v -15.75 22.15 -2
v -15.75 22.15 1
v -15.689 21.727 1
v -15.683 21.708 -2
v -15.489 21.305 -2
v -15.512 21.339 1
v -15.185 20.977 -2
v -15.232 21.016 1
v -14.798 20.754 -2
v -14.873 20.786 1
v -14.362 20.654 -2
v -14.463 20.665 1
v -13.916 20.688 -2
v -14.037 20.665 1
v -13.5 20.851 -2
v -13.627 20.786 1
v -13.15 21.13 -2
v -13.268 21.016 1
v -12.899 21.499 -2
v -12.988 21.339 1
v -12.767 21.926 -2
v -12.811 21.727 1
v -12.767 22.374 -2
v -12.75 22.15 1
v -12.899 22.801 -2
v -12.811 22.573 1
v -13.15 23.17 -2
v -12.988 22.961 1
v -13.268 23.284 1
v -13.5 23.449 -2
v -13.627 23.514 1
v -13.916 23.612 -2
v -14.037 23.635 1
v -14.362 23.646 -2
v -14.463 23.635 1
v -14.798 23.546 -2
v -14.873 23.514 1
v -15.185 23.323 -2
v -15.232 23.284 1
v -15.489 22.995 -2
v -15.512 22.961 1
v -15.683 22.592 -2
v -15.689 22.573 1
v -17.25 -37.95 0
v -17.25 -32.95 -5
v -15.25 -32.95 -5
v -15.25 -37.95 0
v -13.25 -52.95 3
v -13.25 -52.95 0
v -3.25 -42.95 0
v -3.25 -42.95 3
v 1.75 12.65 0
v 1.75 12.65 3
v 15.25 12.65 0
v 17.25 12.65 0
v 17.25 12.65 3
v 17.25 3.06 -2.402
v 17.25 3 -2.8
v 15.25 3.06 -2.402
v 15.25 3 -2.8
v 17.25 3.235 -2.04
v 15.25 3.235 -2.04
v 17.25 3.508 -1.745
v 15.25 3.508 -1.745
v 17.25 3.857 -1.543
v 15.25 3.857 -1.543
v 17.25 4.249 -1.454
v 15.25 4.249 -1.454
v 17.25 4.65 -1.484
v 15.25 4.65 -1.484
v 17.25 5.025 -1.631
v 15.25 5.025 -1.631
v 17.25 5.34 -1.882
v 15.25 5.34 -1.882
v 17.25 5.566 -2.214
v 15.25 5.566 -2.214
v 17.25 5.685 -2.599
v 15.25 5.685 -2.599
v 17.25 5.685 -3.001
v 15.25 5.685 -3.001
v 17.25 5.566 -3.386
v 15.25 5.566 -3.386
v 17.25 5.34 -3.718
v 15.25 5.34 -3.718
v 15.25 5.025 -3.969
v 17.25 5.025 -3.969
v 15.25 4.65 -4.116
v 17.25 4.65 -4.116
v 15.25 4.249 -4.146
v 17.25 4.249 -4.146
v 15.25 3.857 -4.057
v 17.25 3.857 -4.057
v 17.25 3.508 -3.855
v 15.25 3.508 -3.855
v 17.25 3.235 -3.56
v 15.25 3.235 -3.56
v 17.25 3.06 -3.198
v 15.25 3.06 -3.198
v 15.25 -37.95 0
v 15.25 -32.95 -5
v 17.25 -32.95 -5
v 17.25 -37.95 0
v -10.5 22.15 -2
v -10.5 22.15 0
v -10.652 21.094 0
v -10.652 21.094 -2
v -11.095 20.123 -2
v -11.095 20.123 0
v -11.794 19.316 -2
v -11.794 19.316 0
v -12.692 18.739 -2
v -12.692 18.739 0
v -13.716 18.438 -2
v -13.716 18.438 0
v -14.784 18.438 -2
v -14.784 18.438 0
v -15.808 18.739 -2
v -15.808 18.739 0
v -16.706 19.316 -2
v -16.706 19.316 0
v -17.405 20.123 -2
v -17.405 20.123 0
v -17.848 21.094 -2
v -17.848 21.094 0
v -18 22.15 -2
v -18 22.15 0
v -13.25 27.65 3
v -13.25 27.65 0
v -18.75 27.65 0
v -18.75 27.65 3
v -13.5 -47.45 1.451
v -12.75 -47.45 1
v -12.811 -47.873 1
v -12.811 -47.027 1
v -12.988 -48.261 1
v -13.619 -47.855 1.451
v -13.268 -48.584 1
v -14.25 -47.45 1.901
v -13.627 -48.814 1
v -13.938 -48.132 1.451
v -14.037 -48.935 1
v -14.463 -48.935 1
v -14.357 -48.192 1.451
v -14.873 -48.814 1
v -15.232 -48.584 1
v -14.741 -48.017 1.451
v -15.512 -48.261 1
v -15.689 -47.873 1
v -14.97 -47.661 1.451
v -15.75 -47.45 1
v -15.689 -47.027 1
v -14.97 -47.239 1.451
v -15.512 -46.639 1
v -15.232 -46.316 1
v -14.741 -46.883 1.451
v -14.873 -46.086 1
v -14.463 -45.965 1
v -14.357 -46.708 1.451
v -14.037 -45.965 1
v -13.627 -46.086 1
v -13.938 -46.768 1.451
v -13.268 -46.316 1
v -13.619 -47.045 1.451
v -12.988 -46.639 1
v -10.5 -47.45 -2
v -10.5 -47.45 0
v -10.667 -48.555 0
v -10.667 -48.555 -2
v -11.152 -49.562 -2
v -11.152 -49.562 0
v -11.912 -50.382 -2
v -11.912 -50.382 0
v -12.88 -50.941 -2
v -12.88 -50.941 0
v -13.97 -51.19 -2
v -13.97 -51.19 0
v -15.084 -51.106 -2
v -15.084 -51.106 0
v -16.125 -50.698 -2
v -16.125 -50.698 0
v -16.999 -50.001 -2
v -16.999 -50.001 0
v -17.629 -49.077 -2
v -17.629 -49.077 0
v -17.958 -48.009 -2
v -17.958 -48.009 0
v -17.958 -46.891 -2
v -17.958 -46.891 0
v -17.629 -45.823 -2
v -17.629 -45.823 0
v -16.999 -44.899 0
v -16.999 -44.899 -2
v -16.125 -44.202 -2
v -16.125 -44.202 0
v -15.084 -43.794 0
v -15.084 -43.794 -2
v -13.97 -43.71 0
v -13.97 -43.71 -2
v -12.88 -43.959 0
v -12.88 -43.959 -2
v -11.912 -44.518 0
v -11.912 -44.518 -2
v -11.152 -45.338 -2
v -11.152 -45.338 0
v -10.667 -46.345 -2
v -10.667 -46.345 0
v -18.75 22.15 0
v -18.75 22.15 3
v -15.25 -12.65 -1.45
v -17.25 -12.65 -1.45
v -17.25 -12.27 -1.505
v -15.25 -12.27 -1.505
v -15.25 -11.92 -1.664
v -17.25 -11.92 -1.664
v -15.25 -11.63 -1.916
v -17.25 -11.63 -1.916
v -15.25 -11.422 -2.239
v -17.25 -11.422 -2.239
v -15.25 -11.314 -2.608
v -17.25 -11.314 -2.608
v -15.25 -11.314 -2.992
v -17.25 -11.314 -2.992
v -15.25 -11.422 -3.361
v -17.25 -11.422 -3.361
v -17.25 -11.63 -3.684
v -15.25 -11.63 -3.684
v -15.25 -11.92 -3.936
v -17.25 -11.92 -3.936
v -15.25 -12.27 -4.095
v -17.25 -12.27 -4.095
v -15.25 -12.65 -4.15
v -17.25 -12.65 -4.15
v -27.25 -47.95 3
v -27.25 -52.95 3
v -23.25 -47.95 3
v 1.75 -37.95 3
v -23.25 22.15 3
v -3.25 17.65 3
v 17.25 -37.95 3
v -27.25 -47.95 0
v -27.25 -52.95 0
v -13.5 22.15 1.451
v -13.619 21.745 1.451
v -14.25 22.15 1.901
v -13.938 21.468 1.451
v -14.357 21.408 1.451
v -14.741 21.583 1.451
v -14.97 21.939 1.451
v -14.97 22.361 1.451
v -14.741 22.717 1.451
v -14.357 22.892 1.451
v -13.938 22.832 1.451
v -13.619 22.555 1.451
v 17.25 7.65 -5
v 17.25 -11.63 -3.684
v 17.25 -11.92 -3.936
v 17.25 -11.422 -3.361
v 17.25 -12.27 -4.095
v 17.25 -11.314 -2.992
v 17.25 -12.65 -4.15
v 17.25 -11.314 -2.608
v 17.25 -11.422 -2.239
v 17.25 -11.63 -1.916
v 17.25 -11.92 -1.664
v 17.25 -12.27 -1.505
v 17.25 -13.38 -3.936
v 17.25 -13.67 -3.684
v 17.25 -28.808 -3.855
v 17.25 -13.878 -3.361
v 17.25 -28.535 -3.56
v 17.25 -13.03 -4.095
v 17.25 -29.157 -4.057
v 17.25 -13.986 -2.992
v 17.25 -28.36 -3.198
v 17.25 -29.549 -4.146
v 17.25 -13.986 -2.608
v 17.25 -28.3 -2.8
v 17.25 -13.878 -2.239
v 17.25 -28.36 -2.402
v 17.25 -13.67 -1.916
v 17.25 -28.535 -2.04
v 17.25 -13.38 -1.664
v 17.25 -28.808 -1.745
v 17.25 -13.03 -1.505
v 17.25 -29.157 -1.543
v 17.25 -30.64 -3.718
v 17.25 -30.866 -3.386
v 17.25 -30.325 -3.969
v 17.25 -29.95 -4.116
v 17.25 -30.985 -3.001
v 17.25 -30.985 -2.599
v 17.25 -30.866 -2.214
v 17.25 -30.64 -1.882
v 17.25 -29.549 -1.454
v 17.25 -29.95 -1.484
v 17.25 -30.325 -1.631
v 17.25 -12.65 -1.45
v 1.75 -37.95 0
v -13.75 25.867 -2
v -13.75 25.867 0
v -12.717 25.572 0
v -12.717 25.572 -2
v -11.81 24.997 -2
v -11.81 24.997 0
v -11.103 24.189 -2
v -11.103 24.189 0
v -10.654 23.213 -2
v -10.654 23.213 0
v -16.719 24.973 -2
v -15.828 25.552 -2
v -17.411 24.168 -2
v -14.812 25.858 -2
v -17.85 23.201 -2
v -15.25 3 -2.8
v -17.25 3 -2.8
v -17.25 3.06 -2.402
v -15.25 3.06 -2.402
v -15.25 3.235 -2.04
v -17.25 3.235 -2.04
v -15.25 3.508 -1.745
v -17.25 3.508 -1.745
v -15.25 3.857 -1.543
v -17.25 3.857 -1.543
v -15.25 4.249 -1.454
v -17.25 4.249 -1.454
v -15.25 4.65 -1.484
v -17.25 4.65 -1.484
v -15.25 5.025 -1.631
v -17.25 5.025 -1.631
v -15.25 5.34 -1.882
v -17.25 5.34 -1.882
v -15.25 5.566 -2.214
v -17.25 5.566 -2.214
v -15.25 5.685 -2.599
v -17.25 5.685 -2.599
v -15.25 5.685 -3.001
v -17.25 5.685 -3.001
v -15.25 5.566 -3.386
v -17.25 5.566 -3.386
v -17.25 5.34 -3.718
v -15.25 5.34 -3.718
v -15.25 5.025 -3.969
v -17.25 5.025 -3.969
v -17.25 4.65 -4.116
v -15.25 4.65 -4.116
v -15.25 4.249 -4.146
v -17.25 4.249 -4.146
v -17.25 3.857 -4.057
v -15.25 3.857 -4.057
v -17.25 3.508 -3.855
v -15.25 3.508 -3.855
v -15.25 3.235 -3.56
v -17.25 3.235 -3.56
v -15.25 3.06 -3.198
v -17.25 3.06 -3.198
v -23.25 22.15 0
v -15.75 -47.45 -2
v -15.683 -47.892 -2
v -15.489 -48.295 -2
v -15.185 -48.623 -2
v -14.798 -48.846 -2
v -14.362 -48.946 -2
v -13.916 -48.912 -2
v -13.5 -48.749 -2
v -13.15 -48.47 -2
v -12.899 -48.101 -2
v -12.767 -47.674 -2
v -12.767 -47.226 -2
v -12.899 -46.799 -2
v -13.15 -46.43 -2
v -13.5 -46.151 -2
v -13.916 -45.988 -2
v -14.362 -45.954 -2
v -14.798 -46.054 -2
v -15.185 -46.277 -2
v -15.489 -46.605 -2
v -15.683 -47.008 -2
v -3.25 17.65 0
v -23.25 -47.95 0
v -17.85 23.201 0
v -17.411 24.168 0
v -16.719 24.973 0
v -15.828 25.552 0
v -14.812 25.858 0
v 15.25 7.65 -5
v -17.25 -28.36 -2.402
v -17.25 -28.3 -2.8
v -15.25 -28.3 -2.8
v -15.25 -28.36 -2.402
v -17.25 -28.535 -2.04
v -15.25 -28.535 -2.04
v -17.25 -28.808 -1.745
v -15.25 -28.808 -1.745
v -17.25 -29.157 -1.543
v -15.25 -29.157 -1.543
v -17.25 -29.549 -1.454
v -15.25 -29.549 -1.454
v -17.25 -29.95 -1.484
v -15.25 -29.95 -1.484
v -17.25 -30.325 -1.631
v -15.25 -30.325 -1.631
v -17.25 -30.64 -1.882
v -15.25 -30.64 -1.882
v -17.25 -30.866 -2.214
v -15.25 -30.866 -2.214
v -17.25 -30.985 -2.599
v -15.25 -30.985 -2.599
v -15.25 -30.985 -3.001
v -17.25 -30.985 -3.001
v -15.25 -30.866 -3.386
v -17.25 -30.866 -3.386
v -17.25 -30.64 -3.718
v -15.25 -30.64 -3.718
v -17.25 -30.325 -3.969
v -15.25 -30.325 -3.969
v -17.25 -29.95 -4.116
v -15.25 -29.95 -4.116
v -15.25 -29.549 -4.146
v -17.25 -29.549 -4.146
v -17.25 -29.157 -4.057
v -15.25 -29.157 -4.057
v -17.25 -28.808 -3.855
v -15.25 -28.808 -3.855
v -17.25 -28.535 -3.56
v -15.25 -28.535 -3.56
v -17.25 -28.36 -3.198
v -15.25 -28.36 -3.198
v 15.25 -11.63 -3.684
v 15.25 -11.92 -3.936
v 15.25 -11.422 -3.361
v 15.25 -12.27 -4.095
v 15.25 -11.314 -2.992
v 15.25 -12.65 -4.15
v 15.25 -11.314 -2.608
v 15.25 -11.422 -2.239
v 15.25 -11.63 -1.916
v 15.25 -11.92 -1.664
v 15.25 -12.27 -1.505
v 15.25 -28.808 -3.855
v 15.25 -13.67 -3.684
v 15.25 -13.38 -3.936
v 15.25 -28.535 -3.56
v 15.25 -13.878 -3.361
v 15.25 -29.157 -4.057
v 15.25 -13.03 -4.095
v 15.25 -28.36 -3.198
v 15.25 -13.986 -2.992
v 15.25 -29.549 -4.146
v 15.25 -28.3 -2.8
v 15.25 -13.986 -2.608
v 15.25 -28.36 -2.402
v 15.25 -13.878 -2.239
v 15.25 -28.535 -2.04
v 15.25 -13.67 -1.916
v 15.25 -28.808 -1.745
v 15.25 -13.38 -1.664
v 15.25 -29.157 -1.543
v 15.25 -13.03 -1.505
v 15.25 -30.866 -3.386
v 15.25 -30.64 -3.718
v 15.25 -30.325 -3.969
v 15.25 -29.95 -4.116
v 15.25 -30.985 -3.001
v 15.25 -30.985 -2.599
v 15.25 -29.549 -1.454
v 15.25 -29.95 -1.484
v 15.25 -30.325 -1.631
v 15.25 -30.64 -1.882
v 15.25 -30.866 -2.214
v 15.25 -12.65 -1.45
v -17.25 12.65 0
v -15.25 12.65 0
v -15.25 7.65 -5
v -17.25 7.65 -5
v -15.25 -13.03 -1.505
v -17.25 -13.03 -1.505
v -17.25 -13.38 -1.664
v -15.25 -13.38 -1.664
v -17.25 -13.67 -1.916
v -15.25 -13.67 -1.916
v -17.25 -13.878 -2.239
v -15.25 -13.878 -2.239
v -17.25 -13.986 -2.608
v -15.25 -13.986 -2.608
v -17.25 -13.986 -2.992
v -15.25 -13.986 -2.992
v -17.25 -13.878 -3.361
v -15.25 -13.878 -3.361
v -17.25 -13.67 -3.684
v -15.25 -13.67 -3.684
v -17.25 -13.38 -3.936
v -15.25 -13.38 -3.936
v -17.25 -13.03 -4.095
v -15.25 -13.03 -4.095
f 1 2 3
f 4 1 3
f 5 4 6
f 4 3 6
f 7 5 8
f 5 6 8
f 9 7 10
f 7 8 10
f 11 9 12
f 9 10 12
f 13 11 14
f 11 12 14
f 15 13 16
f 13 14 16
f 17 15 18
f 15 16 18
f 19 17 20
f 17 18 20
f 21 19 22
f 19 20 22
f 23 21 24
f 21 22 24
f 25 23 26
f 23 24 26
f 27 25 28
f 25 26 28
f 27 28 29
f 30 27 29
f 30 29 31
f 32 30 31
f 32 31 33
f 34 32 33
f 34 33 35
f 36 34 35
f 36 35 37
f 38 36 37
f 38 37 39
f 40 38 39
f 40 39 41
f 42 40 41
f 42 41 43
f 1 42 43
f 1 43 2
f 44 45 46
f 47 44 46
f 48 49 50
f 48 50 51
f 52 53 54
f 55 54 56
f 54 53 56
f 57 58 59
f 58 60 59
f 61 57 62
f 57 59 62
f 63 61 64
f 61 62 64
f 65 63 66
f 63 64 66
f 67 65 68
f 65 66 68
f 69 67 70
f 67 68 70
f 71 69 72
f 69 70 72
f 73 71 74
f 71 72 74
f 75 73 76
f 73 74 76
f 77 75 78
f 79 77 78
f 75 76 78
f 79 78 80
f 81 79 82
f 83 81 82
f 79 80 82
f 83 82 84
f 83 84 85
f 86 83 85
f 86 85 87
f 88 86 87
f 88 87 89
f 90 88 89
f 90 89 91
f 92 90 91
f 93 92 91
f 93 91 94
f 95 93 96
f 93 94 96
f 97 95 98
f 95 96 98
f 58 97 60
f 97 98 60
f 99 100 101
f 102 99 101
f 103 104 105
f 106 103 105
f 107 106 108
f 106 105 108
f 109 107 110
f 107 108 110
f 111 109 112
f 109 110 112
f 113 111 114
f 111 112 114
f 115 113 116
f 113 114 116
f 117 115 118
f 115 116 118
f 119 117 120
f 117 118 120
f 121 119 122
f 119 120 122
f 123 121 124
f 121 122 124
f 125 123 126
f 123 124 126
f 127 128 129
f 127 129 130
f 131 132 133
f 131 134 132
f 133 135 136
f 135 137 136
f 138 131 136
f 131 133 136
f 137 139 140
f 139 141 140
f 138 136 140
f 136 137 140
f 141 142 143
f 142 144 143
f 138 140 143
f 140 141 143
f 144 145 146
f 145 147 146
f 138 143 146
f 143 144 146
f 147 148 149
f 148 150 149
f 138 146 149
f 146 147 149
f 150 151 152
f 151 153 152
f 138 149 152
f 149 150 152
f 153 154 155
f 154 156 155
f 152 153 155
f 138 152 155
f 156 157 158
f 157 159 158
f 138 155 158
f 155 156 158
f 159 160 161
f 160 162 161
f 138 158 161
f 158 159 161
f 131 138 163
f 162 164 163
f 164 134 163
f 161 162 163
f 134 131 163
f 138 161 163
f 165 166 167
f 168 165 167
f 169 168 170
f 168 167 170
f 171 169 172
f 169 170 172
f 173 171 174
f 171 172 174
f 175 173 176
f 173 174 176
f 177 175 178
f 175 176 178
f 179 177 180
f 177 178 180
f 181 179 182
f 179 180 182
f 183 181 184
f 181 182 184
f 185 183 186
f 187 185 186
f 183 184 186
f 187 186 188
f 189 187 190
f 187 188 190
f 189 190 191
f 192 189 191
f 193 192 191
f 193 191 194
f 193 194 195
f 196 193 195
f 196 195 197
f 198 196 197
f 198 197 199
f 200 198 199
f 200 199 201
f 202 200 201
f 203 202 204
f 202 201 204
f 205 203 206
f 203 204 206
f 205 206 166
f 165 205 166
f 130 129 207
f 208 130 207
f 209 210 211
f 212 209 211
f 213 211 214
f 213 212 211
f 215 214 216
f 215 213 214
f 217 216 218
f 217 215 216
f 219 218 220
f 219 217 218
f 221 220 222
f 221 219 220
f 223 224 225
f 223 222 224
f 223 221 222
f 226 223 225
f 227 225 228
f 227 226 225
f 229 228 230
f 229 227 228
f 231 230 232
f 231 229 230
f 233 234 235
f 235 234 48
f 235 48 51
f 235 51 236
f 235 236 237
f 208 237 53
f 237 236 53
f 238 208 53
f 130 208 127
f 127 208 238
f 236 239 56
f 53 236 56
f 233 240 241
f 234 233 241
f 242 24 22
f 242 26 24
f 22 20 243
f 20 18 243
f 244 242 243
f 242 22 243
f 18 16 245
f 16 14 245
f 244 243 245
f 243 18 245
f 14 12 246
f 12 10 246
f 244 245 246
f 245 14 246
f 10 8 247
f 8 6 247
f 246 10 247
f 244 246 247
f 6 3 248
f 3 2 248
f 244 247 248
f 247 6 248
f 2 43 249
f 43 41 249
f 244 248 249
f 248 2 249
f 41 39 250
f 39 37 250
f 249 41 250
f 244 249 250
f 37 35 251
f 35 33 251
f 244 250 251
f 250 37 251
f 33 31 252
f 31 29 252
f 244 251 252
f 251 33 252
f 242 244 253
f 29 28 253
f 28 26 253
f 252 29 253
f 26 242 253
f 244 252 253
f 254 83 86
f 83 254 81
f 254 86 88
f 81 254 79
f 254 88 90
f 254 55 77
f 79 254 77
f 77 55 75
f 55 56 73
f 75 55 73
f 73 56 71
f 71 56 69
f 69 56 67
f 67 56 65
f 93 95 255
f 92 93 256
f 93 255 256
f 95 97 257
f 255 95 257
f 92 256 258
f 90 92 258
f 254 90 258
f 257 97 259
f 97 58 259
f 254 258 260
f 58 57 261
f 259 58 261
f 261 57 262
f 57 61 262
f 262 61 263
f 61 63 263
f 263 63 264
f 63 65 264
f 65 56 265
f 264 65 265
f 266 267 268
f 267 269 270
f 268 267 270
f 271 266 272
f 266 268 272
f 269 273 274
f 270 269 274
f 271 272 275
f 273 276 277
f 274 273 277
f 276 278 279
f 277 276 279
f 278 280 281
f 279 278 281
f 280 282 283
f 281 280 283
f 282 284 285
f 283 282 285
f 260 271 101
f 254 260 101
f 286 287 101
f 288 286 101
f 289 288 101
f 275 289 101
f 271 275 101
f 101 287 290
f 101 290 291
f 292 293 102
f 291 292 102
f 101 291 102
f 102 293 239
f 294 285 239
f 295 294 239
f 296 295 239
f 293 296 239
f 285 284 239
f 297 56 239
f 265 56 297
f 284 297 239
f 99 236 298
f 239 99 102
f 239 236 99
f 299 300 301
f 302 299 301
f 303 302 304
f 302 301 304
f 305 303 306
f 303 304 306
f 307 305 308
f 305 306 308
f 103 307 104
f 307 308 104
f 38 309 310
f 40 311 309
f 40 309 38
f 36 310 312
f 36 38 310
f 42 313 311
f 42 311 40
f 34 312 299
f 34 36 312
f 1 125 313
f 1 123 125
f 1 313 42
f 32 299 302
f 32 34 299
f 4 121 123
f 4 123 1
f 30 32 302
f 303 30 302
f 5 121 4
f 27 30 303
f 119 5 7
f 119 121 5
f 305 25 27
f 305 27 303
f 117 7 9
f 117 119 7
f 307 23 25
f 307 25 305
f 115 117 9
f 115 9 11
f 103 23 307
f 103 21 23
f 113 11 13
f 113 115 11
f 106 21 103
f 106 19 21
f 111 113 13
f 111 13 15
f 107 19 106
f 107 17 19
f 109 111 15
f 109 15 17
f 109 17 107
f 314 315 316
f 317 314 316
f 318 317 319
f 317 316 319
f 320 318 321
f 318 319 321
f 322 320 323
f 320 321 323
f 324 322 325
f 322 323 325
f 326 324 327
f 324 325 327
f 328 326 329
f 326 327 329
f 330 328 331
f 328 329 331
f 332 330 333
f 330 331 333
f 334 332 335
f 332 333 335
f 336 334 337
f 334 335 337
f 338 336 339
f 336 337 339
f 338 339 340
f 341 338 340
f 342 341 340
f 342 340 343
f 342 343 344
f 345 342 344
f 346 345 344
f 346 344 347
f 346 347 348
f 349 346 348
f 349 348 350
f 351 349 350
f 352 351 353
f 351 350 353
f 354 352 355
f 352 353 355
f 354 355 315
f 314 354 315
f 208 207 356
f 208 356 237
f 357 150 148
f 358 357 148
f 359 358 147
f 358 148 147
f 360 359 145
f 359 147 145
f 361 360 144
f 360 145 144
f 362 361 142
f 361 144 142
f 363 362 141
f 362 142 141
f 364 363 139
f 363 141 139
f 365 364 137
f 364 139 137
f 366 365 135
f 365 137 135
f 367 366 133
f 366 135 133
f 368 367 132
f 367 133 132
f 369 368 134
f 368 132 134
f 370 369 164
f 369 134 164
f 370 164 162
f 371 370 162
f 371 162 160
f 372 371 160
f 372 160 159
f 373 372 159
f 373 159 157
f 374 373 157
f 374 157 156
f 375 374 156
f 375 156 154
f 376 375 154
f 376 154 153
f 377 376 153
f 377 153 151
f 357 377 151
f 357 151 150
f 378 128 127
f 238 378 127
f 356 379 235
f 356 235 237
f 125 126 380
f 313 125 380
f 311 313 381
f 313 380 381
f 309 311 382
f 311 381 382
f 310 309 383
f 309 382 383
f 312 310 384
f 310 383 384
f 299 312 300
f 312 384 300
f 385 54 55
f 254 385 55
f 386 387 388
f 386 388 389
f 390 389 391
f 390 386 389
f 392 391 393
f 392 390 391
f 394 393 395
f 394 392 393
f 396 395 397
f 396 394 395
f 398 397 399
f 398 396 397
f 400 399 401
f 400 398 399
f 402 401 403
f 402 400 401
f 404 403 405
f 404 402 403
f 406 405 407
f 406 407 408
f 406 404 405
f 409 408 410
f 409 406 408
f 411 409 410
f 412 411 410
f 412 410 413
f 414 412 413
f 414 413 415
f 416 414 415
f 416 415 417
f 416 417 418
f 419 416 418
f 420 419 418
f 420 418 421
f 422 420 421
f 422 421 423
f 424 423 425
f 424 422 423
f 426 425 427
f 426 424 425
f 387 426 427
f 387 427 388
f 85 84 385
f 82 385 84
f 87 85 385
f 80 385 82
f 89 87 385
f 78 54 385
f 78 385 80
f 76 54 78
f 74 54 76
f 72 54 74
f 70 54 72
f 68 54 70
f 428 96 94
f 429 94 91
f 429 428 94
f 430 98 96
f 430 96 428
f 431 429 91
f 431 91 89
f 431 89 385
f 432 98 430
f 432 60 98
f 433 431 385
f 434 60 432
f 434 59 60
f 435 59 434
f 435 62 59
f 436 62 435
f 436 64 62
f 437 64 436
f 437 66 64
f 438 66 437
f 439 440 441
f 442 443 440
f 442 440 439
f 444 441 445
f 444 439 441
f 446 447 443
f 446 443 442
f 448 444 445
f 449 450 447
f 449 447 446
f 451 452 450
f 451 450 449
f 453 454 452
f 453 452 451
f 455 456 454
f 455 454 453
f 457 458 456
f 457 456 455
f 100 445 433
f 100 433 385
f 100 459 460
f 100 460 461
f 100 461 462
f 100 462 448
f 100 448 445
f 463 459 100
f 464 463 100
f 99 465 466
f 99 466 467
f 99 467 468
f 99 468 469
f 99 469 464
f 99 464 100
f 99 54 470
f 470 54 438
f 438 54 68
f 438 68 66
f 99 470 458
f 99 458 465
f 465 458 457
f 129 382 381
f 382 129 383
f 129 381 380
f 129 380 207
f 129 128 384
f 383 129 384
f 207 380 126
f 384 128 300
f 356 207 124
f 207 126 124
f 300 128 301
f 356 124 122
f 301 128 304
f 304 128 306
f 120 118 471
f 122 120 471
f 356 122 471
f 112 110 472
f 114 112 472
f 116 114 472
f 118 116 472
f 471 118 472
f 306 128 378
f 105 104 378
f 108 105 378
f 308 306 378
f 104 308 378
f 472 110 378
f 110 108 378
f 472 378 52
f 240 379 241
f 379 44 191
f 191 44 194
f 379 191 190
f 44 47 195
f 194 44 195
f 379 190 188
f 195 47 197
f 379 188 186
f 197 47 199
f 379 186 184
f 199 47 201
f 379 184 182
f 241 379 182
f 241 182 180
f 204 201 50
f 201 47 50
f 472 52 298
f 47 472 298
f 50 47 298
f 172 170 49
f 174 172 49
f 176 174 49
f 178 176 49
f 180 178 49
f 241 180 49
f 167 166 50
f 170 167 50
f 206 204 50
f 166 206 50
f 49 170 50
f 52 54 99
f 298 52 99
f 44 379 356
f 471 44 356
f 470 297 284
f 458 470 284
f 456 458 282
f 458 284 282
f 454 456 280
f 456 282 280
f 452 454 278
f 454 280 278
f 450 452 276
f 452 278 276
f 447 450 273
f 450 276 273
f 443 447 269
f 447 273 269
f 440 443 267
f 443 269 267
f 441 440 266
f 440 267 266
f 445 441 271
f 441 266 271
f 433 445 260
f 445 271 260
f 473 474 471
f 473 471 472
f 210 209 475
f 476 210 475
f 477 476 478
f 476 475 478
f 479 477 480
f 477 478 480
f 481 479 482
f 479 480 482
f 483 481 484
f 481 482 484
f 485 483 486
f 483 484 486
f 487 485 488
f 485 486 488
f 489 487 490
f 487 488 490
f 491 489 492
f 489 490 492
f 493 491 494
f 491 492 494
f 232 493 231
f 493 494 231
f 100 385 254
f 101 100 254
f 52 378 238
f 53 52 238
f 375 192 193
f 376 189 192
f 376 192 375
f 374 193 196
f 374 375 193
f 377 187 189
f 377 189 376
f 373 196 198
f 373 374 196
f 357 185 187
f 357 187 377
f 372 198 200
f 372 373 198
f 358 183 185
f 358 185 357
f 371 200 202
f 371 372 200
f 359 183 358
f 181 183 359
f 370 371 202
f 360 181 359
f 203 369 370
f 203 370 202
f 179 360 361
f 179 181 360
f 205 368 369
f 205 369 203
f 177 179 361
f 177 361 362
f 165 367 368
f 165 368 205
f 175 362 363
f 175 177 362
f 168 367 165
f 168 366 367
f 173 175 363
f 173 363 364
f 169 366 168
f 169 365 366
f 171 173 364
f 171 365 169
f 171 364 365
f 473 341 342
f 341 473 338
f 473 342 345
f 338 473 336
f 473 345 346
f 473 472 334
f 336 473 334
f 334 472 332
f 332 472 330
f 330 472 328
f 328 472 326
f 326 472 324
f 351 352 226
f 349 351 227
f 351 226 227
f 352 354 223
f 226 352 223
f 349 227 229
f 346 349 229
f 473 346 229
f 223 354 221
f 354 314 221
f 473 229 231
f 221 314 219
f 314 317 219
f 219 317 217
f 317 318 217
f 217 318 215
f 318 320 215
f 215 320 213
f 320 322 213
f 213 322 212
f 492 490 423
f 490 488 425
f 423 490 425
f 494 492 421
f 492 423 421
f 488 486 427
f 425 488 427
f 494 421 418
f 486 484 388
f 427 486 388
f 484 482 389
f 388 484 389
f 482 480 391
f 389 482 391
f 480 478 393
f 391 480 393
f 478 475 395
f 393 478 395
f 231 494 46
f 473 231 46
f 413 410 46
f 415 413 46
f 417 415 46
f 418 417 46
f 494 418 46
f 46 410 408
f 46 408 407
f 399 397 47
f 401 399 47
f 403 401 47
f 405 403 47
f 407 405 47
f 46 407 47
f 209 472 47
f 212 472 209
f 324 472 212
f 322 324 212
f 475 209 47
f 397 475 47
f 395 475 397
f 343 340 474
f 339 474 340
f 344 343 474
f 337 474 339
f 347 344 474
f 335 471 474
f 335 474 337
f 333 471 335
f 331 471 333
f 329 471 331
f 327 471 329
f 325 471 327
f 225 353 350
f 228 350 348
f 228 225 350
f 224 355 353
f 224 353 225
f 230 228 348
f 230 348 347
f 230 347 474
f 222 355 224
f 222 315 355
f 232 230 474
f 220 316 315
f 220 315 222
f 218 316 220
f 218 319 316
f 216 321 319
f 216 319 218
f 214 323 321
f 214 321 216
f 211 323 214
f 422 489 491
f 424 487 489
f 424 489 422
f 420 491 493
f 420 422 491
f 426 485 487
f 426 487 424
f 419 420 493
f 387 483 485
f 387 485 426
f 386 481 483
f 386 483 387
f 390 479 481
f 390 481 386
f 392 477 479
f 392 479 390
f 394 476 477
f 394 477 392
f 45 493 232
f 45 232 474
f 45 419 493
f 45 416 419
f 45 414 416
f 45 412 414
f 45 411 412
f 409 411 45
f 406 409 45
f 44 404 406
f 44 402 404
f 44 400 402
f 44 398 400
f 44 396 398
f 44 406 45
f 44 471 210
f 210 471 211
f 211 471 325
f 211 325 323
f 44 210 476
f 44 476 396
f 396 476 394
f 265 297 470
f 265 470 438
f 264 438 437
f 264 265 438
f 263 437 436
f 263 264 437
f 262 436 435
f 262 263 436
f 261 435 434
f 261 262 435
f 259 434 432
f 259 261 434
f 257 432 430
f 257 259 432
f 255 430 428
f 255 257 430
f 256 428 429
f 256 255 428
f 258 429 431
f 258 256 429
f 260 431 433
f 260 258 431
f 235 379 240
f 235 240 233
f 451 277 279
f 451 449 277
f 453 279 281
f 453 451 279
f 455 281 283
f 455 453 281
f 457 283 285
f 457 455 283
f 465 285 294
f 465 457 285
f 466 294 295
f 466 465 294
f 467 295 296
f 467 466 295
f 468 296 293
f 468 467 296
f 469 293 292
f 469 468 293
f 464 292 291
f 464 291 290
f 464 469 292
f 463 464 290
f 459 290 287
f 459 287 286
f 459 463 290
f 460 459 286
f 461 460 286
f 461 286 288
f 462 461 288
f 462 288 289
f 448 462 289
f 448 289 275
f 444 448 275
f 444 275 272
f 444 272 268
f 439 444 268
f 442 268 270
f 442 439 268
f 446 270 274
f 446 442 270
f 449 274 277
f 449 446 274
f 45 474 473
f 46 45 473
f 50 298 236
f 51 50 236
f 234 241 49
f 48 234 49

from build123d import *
from build123d import SkipClean  # not in build123d's __all__

# Parameters (mm, degrees)
F0_W                   = 3
F0_H                   = 25.3
F0_W_2                 = 30.5
F1_DEPTH               = 3
F2_DEPTH               = 5
F3_R                   = 1.35
F4_DEPTH               = 500
F7_SIZE                = 5
F8_R                   = 1.35
F9_DEPTH               = 1
F10_W                  = 15
F10_H                  = 15
F11_DEPTH              = 3
F12_W                  = 4
F12_H                  = 5
F13_DEPTH              = 3
F12_W_2                = 4.5
F12_H_2                = 5.5
F14_DEPTH              = 25
F15_DEPTH              = 5
F16_R                  = 3.75
F17_DEPTH              = 2
F20_D                  = 3
F20_DEPTH              = 3
F20_CBORE_D            = 3
F20_CBORE_DEPTH        = 3
F20_TIP                = 0.9012909285
F20_ON_F19_D           = 3
F20_ON_F19_DEPTH       = 3
F20_ON_F19_CBORE_D     = 3
F20_ON_F19_CBORE_DEPTH = 3
F20_ON_F19_TIP         = 0.9012909285
F21_SIZE               = 10
F22_DEPTH              = 1
F23_SIZE               = 4.99999


# Not quite as in the source:
# - a fillet or chamfer is up to 0.001 mm smaller than in the source, because OpenCascade refuses the exact size


with BuildPart() as f1:
    # F0 (on Top) → F1 (new body)
    with BuildSketch(Plane.XY):
        with Locations((16.75, 0)):
            Rectangle(F0_W, F0_H)
        Rectangle(F0_W_2, F0_H)
        with Locations((-16.75, 0)):
            Rectangle(F0_W, F0_H)
    extrude(amount=F1_DEPTH)

    # F0 (on Top) → F2 (join)
    with BuildSketch(Plane.XY):
        with Locations((16.75, 0)):
            Rectangle(F0_W, F0_H)
        with Locations((-16.75, 0)):
            Rectangle(F0_W, F0_H)
    extrude(amount=-F2_DEPTH)

    # F3 (on face) → F4 (cut, symmetric)
    with BuildSketch(Plane(origin=(15.25, 0, 0), x_dir=(0, -1, 0), z_dir=(-1, 0, 0))):
        with BuildLine():
            Line((12.65, -4.15), (12.65, -1.45))
            ThreePointArc((12.65, -1.45), (11.3, -2.8), (12.65, -4.15))
        make_face()
        with Locations((-4.35, -2.8)):
            Circle(F3_R)
    extrude(amount=F4_DEPTH, both=True, mode=Mode.SUBTRACT)

    # F6: F1 across plane


with BuildPart() as f1_1:
    add(f1.part, clean=False)
    with SkipClean():  # cleaning this boolean's faces spoils the solid; the shape is the same uncleaned
        add(f1.part.mirror(Plane.XZ.offset(12.65)), clean=False)

    # F7
    f7_edges = [f1_1.edges().sort_by_distance(p)[0] for p in [
        (-16.75, 12.65, -5),
        (16.75, 12.65, -5),
        (16.75, -37.95, -5),
        (-16.75, -37.95, -5),
    ]]
    chamfer(f7_edges, length=F7_SIZE)

    # F8 (on face) → F9 (cut)
    with BuildSketch(Plane(origin=(-18.25, 0, 0), x_dir=(0, -1, 0), z_dir=(-1, 0, 0))):
        with BuildLine():
            Line((12.65, 0), (-12.65, 0))
            Line((-12.65, 0), (-7.65, -5))
            Line((-7.65, -5), (12.65, -5))
            Line((12.65, -5), (12.65, -4.15))
            ThreePointArc((12.65, -4.15), (11.3, -2.8), (12.65, -1.45))
            Line((12.65, -1.45), (12.65, 0))
        make_face()
        with Locations((-4.35, -2.8)):
            Circle(F8_R, mode=Mode.SUBTRACT)
        with BuildLine():
            Line((37.95, 0), (12.65, 0))
            Line((12.65, 0), (12.65, -1.45))
            ThreePointArc((12.65, -1.45), (14, -2.8), (12.65, -4.15))
            Line((12.65, -4.15), (12.65, -5))
            Line((12.65, -5), (32.95, -5))
            Line((32.95, -5), (37.95, 0))
        make_face()
        with Locations((29.65, -2.8)):
            Circle(F8_R, mode=Mode.SUBTRACT)
    extrude(amount=-F9_DEPTH, mode=Mode.SUBTRACT)

    # F10 (on Top) → F11 (join)
    with BuildSketch(Plane.XY):
        with Locations((-10.75, -45.45)):
            Rectangle(F10_W, F10_H)
        with Locations((-10.75, 20.15)):
            Rectangle(F10_W, F10_H)
    extrude(amount=F11_DEPTH)

    # F12 (on face) → F13 (join)
    with BuildSketch(Plane(origin=(0, 0, 0), x_dir=(1, 0, 0), z_dir=(0, 0, -1))):
        with Locations((-20.25, 50.45)):
            Rectangle(F12_W, F12_H)
    extrude(amount=-F13_DEPTH)

    # F12 (on face) → F14 (cut)
    with BuildSketch(Plane(origin=(0, 0, 0), x_dir=(1, 0, 0), z_dir=(0, 0, -1))):
        with Locations((-16, -24.9)):
            Rectangle(F12_W_2, F12_H_2)
    extrude(amount=-F14_DEPTH, mode=Mode.SUBTRACT)

    # F15 (add): faces of the model
    f15_faces = [f1_1.faces().sort_by_distance(p)[0] for p in [
        (-18.25, 0, 1.5),
        (-18.25, -25.3, 1.5),
        (-18.25, -42.95, 1.5),
        (-18.25, 17.4, 1.5),
        (-22.25, -50.45, 1.5),
        (-13.75, 24.9, 1.5),
    ]]
    extrude(f15_faces, amount=F15_DEPTH)

    # F16 (on face) → F17 (join)
    with BuildSketch(Plane(origin=(0, 0, 0), x_dir=(1, 0, 0), z_dir=(0, 0, -1))):
        with BuildLine():
            Line((-13.75, -22.15), (-18, -22.15))
            ThreePointArc((-18, -22.15), (-16.7185522073, -24.9728974477), (-13.75, -25.8665171868))
            Line((-13.75, -25.8665171868), (-13.75, -22.15))
        make_face()
        with BuildLine():
            ThreePointArc((-13.75, -25.8665171868), (-11.4271025523, -24.6185522073), (-10.5, -22.15))
            ThreePointArc((-10.5, -22.15), (-14.25, -18.4), (-18, -22.15))
            Line((-18, -22.15), (-13.75, -22.15))
            Line((-13.75, -22.15), (-13.75, -25.8665171868))
        make_face()
        with Locations((-14.25, 47.45)):
            Circle(F16_R)
    extrude(amount=F17_DEPTH)

    # F20
    with Locations(Plane(origin=(0, 0, -2), x_dir=(1, 0, 0), z_dir=(0, 0, -1))):
        with Locations((-14.25, 47.45)):
            CounterBoreHole(F20_D / 2, F20_CBORE_D / 2, F20_CBORE_DEPTH, depth=F20_DEPTH)
            with Locations((0, 0, -(F20_DEPTH + F20_TIP / 2))):  # 118° drill point
                Cone(0, F20_D / 2, F20_TIP, mode=Mode.SUBTRACT)

    # F20 on F19
    with Locations(Plane(origin=(0, 0, -2), x_dir=(1, 0, 0), z_dir=(0, 0, -1))):
        with Locations((-14.25, -22.15)):
            CounterBoreHole(F20_ON_F19_D / 2, F20_ON_F19_CBORE_D / 2, F20_ON_F19_CBORE_DEPTH, depth=F20_ON_F19_DEPTH)
            with Locations((0, 0, -(F20_ON_F19_DEPTH + F20_ON_F19_TIP / 2))):  # 118° drill point
                Cone(0, F20_ON_F19_D / 2, F20_ON_F19_TIP, mode=Mode.SUBTRACT)

    # F21
    f21_edges = [f1_1.edges().sort_by_distance(p)[0] for p in [
        (-3.25, 27.65, 1.5),
        (-3.25, -52.95, 1.5),
    ]]
    chamfer(f21_edges, length=F21_SIZE)

    # F22 (cut): a face of the model
    f22_faces = [f1_1.faces().sort_by_distance(p)[0] for p in [
        (18.25, -12.65, -0.7538732148),
    ]]
    extrude(f22_faces, amount=-F22_DEPTH, mode=Mode.SUBTRACT)

    # F23 (size 5 in the source; OpenCascade refuses exactly that, so slightly less here)
    f23_edges = [f1_1.edges().sort_by_distance(p)[0] for p in [
        (-3.25, -37.95, 1.5),
        (-3.25, 12.65, 1.5),
    ]]
    chamfer(f23_edges, length=F23_SIZE)


solid = f1_1.part
